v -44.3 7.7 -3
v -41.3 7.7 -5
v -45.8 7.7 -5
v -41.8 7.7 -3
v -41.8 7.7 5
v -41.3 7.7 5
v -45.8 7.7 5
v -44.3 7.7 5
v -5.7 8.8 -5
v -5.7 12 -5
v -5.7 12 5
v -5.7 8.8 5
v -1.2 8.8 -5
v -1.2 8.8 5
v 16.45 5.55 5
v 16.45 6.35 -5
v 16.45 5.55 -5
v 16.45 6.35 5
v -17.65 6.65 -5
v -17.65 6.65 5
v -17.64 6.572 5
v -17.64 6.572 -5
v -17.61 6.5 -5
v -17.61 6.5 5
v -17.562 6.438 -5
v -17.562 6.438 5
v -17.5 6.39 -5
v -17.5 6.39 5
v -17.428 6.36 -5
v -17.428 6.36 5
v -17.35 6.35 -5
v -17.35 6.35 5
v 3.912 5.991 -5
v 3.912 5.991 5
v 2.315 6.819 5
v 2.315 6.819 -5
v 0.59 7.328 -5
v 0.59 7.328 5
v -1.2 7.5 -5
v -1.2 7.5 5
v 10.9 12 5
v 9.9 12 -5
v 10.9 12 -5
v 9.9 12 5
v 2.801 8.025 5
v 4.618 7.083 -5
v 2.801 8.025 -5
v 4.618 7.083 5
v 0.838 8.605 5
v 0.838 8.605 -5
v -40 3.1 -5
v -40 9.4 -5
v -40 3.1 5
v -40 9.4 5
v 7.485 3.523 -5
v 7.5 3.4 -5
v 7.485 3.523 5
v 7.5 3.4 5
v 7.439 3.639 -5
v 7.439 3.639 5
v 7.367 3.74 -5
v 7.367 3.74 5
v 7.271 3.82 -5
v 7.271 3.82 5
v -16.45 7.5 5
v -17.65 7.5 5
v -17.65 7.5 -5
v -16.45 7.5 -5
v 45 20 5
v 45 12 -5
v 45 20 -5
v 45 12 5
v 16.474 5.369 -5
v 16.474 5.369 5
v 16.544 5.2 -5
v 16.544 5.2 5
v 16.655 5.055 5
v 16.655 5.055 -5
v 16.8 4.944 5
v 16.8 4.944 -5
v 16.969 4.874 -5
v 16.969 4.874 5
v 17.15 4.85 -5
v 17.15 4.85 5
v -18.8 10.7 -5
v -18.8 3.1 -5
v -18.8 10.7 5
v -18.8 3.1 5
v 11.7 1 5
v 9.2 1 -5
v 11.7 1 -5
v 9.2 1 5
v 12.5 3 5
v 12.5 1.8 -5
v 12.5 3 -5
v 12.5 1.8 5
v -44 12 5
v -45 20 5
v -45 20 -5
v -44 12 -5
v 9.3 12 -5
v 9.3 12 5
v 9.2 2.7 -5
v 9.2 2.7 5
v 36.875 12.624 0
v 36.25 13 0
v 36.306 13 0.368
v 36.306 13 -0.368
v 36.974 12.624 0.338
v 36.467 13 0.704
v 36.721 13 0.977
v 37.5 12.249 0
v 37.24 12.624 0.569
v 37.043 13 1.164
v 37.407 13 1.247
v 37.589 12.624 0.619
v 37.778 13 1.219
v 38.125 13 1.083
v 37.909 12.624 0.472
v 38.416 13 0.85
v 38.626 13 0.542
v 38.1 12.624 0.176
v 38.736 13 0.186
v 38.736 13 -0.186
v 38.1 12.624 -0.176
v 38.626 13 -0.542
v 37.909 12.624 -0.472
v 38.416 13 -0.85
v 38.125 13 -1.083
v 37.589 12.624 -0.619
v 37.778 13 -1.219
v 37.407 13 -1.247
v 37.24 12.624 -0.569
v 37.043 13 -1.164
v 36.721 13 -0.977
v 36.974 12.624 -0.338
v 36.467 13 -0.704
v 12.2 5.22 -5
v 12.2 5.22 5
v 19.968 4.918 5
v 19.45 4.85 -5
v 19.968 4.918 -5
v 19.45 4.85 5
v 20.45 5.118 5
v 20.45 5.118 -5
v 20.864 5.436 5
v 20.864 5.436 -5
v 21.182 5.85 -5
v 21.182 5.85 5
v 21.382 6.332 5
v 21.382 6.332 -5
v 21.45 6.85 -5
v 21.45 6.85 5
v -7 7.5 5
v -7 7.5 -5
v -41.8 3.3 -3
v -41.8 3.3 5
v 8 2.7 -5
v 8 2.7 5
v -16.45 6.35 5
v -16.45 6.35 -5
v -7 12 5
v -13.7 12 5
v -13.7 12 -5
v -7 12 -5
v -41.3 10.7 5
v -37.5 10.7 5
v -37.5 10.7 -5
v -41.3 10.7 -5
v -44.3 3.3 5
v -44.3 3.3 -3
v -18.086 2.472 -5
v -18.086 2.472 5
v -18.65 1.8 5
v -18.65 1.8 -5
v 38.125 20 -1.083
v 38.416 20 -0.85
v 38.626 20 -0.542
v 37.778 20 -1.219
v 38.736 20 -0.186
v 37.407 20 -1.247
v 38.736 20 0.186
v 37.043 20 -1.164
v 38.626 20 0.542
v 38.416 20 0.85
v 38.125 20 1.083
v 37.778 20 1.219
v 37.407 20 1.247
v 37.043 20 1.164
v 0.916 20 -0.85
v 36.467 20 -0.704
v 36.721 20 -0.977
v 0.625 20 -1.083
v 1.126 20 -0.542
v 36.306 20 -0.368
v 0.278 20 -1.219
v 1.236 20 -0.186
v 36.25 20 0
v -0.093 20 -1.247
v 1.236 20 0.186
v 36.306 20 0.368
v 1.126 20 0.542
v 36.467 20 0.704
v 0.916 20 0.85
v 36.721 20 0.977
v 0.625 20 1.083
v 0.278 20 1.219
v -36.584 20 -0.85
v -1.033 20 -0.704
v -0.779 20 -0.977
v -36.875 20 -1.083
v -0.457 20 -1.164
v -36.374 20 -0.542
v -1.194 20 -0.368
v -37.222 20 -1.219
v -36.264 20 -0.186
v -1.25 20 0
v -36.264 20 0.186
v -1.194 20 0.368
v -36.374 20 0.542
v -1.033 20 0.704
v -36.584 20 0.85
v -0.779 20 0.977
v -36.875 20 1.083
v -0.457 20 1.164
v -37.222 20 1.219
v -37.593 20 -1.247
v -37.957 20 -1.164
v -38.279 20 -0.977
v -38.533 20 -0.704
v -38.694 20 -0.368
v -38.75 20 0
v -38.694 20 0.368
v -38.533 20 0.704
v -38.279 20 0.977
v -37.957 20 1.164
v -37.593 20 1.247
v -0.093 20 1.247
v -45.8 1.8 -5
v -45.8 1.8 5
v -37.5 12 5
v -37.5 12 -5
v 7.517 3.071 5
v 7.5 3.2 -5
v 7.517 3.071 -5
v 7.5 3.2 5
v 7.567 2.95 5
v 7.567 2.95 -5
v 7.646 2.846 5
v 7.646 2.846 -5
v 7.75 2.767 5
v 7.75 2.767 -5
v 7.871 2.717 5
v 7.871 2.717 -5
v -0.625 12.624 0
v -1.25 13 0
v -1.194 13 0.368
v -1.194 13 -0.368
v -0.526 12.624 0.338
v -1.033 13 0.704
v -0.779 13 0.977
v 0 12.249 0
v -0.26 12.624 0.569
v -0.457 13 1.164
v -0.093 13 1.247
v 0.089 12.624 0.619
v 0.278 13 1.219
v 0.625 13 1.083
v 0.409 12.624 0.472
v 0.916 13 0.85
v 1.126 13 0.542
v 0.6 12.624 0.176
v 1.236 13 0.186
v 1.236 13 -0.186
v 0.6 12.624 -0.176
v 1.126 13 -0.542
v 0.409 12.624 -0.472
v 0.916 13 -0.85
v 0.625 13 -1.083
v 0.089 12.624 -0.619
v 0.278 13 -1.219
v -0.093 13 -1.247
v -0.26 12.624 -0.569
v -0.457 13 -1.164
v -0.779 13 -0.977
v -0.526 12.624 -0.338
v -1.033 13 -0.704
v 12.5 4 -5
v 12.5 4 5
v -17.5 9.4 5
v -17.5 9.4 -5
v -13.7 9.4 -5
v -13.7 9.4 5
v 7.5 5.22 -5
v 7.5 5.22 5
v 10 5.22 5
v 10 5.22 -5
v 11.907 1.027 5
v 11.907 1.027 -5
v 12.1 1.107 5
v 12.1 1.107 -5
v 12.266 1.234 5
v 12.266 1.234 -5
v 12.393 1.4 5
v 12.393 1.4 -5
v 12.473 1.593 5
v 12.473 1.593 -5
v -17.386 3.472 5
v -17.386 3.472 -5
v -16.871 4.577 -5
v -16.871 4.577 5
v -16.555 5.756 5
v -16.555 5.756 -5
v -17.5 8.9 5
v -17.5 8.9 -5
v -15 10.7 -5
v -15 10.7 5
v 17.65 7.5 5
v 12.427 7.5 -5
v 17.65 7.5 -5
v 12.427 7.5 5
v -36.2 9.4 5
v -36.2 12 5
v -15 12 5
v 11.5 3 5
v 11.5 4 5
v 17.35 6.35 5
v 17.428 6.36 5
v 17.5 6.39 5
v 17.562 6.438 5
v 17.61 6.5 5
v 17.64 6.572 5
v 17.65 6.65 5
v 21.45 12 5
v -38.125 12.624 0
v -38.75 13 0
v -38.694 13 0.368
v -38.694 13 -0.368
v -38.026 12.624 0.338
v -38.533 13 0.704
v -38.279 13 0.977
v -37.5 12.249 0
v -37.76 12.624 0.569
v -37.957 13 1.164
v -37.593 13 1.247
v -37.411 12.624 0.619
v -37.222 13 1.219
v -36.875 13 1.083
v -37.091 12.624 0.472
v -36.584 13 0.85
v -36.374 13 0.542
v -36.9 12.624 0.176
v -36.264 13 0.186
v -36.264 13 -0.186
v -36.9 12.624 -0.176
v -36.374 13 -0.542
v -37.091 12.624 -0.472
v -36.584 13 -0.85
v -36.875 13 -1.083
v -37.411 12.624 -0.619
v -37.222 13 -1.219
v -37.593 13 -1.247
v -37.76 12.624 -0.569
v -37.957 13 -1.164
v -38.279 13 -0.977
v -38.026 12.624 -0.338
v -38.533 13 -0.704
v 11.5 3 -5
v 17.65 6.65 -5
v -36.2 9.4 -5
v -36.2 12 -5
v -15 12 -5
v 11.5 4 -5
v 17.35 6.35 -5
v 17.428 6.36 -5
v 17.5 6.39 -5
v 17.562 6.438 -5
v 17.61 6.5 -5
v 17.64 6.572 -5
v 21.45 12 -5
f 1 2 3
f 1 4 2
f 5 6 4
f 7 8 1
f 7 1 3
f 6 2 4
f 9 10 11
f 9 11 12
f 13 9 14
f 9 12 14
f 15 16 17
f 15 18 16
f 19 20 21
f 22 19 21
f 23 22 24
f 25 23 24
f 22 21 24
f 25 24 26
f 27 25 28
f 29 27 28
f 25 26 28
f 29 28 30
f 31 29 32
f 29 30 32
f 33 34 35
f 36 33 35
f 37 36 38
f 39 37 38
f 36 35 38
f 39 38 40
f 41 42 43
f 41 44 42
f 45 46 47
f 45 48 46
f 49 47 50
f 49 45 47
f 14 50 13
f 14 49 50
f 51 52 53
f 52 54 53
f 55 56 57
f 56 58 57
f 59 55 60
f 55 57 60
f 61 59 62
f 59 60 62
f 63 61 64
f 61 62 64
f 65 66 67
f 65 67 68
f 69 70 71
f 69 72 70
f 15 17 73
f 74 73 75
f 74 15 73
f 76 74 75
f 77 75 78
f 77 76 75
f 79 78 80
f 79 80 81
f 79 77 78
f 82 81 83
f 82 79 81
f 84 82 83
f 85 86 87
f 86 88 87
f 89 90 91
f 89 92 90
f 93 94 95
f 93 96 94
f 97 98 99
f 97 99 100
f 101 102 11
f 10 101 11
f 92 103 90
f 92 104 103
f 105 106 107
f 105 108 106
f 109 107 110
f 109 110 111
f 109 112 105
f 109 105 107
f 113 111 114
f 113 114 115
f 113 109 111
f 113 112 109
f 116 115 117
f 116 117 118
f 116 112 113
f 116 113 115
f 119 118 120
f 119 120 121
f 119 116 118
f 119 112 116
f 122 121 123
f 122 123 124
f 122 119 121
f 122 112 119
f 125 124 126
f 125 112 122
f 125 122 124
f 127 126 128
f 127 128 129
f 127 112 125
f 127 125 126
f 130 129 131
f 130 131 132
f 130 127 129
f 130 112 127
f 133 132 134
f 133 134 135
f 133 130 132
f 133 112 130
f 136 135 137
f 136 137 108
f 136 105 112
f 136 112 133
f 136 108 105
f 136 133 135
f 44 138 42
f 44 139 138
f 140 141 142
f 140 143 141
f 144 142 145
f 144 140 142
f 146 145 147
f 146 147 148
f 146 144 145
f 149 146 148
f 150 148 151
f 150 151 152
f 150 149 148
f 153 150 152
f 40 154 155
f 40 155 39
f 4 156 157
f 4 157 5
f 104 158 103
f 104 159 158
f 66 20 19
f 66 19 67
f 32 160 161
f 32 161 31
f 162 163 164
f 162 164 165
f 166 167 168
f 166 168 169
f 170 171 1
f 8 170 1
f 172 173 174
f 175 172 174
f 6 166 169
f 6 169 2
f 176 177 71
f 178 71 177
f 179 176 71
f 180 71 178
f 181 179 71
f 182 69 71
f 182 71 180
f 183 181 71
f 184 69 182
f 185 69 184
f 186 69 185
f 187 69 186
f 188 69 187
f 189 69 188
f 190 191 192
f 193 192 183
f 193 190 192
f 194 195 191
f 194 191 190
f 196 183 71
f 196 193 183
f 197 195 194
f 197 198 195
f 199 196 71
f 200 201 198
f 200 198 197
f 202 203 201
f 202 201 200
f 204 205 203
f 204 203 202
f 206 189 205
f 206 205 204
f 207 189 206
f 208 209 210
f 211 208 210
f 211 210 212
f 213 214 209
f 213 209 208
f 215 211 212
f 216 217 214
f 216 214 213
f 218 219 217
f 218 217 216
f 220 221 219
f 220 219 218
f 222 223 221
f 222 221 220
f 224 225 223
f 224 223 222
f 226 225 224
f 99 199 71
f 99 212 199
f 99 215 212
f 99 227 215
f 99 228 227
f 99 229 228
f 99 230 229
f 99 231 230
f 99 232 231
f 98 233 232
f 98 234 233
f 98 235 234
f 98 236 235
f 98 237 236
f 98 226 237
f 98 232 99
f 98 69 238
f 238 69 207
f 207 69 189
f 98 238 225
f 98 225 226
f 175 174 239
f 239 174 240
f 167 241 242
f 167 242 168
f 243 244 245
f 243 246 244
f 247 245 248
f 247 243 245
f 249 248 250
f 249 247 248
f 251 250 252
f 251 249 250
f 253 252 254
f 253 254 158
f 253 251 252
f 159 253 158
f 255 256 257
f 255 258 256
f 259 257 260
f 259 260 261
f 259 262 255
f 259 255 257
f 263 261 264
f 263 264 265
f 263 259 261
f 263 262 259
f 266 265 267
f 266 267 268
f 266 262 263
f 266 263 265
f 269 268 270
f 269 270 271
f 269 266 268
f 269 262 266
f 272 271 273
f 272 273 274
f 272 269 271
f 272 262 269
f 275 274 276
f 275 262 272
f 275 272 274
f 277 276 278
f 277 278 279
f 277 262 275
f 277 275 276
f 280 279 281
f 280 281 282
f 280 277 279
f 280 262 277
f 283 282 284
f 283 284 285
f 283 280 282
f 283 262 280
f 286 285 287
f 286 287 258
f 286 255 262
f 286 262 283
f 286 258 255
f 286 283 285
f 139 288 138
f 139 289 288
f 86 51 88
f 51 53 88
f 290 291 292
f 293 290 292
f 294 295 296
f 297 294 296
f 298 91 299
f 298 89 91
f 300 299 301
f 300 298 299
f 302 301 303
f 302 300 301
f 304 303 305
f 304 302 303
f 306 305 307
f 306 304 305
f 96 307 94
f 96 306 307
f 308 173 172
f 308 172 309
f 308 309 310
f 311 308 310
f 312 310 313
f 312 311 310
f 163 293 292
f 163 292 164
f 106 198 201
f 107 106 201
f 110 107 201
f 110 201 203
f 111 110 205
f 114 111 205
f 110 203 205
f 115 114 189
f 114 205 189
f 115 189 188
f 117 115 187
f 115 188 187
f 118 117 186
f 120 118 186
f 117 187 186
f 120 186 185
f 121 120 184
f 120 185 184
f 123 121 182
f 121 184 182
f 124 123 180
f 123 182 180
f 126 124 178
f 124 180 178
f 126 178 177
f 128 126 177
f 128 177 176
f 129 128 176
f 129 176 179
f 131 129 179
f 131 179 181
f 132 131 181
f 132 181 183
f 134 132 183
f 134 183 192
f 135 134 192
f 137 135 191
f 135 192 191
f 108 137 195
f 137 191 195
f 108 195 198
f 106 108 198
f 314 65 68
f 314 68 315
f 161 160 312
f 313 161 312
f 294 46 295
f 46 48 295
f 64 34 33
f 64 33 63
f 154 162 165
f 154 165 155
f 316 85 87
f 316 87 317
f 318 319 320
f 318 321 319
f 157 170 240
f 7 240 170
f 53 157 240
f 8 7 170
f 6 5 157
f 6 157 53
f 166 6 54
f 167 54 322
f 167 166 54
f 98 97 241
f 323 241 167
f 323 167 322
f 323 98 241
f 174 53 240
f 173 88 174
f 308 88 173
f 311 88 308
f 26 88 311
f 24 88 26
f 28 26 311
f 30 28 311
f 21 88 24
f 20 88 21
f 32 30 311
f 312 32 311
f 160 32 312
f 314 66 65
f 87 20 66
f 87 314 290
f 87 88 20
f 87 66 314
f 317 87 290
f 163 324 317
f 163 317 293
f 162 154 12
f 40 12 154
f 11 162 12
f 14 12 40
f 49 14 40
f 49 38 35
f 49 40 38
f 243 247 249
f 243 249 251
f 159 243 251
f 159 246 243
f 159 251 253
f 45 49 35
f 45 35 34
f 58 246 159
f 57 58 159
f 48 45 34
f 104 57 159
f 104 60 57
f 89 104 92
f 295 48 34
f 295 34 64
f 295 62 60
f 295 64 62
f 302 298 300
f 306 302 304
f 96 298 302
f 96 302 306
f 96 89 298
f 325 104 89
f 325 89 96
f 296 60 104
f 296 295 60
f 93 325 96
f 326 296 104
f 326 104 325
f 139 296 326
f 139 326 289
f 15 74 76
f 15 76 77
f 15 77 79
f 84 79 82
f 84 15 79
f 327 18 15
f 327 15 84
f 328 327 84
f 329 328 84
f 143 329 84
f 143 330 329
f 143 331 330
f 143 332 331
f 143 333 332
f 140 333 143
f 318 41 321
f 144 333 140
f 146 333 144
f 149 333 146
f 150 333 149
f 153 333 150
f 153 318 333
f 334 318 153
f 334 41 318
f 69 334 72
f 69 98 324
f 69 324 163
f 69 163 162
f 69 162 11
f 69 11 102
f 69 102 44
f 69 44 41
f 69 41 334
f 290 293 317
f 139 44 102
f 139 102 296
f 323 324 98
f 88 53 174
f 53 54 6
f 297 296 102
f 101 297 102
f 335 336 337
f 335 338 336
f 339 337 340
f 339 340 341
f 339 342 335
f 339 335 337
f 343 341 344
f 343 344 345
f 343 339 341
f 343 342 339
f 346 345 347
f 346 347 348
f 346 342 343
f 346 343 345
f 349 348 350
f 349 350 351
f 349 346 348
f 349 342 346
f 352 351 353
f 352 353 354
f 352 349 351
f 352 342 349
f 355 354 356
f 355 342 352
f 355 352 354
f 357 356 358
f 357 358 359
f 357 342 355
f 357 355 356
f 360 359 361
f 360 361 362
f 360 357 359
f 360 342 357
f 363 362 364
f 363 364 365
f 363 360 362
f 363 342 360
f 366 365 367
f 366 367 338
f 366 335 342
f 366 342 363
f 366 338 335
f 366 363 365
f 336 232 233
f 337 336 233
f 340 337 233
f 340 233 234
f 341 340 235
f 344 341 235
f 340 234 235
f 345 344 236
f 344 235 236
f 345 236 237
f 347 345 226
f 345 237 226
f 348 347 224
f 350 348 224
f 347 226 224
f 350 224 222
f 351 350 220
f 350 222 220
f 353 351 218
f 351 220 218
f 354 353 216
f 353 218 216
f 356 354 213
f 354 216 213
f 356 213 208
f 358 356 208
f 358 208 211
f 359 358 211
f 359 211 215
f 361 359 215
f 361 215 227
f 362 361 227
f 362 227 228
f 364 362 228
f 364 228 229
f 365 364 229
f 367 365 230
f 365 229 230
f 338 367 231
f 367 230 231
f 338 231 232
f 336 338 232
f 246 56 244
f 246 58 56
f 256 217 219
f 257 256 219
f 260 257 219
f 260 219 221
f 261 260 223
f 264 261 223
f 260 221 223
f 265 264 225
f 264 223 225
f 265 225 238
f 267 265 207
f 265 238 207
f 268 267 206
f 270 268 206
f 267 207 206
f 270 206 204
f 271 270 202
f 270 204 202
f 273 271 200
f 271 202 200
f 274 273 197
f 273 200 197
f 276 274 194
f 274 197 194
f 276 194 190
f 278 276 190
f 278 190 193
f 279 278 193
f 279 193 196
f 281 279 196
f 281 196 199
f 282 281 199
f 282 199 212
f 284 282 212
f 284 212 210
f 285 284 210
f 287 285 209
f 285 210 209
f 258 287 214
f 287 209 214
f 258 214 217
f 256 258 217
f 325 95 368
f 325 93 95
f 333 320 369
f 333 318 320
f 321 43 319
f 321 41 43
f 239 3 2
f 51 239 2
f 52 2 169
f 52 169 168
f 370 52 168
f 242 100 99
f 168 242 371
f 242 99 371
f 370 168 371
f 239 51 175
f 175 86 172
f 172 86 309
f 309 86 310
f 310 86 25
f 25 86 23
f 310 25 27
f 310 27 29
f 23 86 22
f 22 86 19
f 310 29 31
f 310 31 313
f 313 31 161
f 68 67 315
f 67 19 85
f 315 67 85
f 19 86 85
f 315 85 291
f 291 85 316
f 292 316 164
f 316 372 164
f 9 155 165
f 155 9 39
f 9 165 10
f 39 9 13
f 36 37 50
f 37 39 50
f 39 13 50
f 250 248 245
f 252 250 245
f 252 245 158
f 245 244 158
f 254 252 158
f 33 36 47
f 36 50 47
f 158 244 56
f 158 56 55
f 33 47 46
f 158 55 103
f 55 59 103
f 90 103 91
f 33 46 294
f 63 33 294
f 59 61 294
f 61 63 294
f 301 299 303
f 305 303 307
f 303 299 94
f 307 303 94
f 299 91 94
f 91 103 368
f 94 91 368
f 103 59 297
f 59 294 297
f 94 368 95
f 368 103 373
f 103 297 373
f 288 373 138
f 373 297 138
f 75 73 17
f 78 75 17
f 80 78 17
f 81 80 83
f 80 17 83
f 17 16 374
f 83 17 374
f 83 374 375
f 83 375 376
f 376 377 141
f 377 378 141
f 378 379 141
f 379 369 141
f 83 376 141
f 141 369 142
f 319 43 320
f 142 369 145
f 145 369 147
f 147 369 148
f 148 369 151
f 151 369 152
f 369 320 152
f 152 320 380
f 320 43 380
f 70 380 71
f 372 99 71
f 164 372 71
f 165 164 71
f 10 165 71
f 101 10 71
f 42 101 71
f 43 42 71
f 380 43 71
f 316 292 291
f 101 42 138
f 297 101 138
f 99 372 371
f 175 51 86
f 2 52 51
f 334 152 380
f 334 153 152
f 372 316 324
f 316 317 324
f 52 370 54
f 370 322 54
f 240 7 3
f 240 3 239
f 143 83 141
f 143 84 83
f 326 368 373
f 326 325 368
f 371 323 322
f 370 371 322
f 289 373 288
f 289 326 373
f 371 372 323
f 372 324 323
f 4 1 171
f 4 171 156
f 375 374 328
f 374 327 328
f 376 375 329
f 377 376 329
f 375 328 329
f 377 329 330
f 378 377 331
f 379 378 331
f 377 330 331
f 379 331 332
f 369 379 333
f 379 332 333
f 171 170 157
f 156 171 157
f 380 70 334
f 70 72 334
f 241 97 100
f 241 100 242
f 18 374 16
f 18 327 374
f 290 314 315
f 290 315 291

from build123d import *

# Parameters (mm, degrees)
PAD_DEPTH    = 5
SKETCH001_W  = 2.5
SKETCH001_H  = 4.4
POCKET_DEPTH = 8
SKETCH002_R  = 1.25
HOLE_DEPTH   = 7
HOLE_TIPS_R  = 1.25


with BuildPart() as part:
    # Sketch → Pad (new body, symmetric)
    with BuildSketch(Plane.XY):
        with BuildLine():
            Line((45, 12), (45, 20))
            Line((45, 20), (-45, 20))
            Line((-45, 20), (-44, 12))
            Line((-44, 12), (-37.5, 12))
            Line((-37.5, 12), (-37.5, 10.7))
            Line((-37.5, 10.7), (-41.3, 10.7))
            Line((-41.3, 10.7), (-41.3, 7.7))
            Line((-41.3, 7.7), (-45.8, 7.7))
            Line((-45.8, 7.7), (-45.8, 1.8))
            Line((-41.3, 1.8), (-45.8, 1.8))
            Line((-18.65, 1.8), (-41.3, 1.8))
            Line((-18.086075, 2.472059), (-18.65, 1.8))
            ThreePointArc((-18.086075, 2.472059), (-17.104232, 4.013245), (-16.554732, 5.756036))
            Line((-16.45, 6.35), (-16.554732, 5.756036))
            Line((-16.45, 6.35), (-17.35, 6.35))
            ThreePointArc((-17.65, 6.65), (-17.562132, 6.437868), (-17.35, 6.35))
            Line((-17.65, 6.65), (-17.65, 7.5))
            Line((-17.65, 7.5), (-16.45, 7.5))
            Line((-16.45, 7.5), (-17.5, 8.9))
            Line((-17.5, 8.9), (-17.5, 9.4))
            Line((-17.5, 9.4), (-13.7, 9.4))
            Line((-13.7, 9.4), (-13.7, 12))
            Line((-13.7, 12), (-7, 12))
            Line((-7, 12), (-7, 7.5))
            Line((-7, 7.5), (-1.2, 7.5))
            ThreePointArc((3.912237, 5.991471), (1.465081, 7.114997), (-1.2, 7.5))
            Line((3.912237, 5.991471), (7.271446, 3.819901))
            ThreePointArc((7.5, 3.4), (7.43916, 3.639036), (7.271446, 3.819901))
            Line((7.5, 3.4), (7.5, 3.2))
            ThreePointArc((7.5, 3.2), (7.646447, 2.846447), (8, 2.7))
            Line((8, 2.7), (9.2, 2.7))
            Line((9.2, 2.7), (9.2, 1))
            Line((9.2, 1), (11.7, 1))
            ThreePointArc((11.7, 1), (12.265685, 1.234315), (12.5, 1.8))
            Line((12.5, 1.8), (12.5, 3))
            Line((12.5, 3), (11.5, 3))
            Line((11.5, 3), (11.5, 4))
            Line((11.5, 4), (12.5, 4))
            Line((12.5, 4), (12.2, 5.220135))
            Line((12.2, 5.220135), (9.9, 12))
            Line((9.9, 12), (10.9, 12))
            Line((10.9, 12), (12.426579, 7.5))
            Line((12.426579, 7.5), (17.65, 7.5))
            Line((17.65, 7.5), (17.65, 6.65))
            ThreePointArc((17.35, 6.35), (17.562132, 6.437868), (17.65, 6.65))
            Line((17.35, 6.35), (16.45, 6.35))
            Line((16.45, 6.35), (16.45, 5.55))
            ThreePointArc((16.45, 5.55), (16.655025, 5.055025), (17.15, 4.85))
            Line((17.15, 4.85), (19.45, 4.85))
            ThreePointArc((19.45, 4.85), (20.864214, 5.435786), (21.45, 6.85))
            Line((21.45, 6.85), (21.45, 12))
            Line((45, 12), (21.45, 12))
        make_face()
        with BuildLine():
            Line((-5.7, 12), (-5.7, 8.8))
            Line((-5.7, 8.8), (-1.2, 8.8))
            ThreePointArc((4.617998, 7.083214), (1.833004, 8.361846), (-1.2, 8.8))
            Line((4.617998, 7.083214), (7.5, 5.220135))
            Line((7.5, 5.220135), (10, 5.220135))
            Line((10, 5.220135), (9.3, 12))
            Line((9.3, 12), (-5.7, 12))
        make_face(mode=Mode.SUBTRACT)
        Polygon((-36.2, 12), (-36.2, 9.4), (-40, 9.4), (-40, 3.1), (-18.8, 3.1), (-18.8, 10.7), (-15, 10.7), (-15, 12), align=None, mode=Mode.SUBTRACT)
    extrude(amount=PAD_DEPTH, both=True)

    # Sketch001 (on Face67 of Pad) → Pocket (cut)
    with BuildSketch(Plane.XY.offset(5)):
        with Locations((-43.05, 5.5)):
            Rectangle(SKETCH001_W, SKETCH001_H)
    extrude(amount=-POCKET_DEPTH, mode=Mode.SUBTRACT)

    # Sketch002 (on Face13 of Pocket) → Hole (cut)
    with BuildSketch(Plane(origin=(0, 20, 0), x_dir=(-1, 0, 0), z_dir=(0, 1, 0))):
        Circle(SKETCH002_R)
        with Locations((-37.5, 0)):
            Circle(SKETCH002_R)
        with Locations((37.5, 0)):
            Circle(SKETCH002_R)
    extrude(amount=-HOLE_DEPTH, mode=Mode.SUBTRACT)

    # Hole tips → Hole tip 1 section 0
    with BuildSketch(Plane(origin=(0, 13, 0), x_dir=(-1, 0, 0), z_dir=(0, 1, 0)), mode=Mode.PRIVATE) as hole_tip_1_s0:
        Circle(HOLE_TIPS_R)
    loft([hole_tip_1_s0.sketch, Vertex(0, 12.248924, 0)], mode=Mode.SUBTRACT)

    # Hole tips → Hole tip 2 section 0
    with BuildSketch(Plane(origin=(0, 13, 0), x_dir=(-1, 0, 0), z_dir=(0, 1, 0)), mode=Mode.PRIVATE) as hole_tip_2_s0:
        with Locations((-37.5, 0)):
            Circle(HOLE_TIPS_R)
    loft([hole_tip_2_s0.sketch, Vertex(37.5, 12.248924, 0)], mode=Mode.SUBTRACT)

    # Hole tips → Hole tip 3 section 0
    with BuildSketch(Plane(origin=(0, 13, 0), x_dir=(-1, 0, 0), z_dir=(0, 1, 0)), mode=Mode.PRIVATE) as hole_tip_3_s0:
        with Locations((37.5, 0)):
            Circle(HOLE_TIPS_R)
    loft([hole_tip_3_s0.sketch, Vertex(-37.5, 12.248924, 0)], mode=Mode.SUBTRACT)


solid = part.part
